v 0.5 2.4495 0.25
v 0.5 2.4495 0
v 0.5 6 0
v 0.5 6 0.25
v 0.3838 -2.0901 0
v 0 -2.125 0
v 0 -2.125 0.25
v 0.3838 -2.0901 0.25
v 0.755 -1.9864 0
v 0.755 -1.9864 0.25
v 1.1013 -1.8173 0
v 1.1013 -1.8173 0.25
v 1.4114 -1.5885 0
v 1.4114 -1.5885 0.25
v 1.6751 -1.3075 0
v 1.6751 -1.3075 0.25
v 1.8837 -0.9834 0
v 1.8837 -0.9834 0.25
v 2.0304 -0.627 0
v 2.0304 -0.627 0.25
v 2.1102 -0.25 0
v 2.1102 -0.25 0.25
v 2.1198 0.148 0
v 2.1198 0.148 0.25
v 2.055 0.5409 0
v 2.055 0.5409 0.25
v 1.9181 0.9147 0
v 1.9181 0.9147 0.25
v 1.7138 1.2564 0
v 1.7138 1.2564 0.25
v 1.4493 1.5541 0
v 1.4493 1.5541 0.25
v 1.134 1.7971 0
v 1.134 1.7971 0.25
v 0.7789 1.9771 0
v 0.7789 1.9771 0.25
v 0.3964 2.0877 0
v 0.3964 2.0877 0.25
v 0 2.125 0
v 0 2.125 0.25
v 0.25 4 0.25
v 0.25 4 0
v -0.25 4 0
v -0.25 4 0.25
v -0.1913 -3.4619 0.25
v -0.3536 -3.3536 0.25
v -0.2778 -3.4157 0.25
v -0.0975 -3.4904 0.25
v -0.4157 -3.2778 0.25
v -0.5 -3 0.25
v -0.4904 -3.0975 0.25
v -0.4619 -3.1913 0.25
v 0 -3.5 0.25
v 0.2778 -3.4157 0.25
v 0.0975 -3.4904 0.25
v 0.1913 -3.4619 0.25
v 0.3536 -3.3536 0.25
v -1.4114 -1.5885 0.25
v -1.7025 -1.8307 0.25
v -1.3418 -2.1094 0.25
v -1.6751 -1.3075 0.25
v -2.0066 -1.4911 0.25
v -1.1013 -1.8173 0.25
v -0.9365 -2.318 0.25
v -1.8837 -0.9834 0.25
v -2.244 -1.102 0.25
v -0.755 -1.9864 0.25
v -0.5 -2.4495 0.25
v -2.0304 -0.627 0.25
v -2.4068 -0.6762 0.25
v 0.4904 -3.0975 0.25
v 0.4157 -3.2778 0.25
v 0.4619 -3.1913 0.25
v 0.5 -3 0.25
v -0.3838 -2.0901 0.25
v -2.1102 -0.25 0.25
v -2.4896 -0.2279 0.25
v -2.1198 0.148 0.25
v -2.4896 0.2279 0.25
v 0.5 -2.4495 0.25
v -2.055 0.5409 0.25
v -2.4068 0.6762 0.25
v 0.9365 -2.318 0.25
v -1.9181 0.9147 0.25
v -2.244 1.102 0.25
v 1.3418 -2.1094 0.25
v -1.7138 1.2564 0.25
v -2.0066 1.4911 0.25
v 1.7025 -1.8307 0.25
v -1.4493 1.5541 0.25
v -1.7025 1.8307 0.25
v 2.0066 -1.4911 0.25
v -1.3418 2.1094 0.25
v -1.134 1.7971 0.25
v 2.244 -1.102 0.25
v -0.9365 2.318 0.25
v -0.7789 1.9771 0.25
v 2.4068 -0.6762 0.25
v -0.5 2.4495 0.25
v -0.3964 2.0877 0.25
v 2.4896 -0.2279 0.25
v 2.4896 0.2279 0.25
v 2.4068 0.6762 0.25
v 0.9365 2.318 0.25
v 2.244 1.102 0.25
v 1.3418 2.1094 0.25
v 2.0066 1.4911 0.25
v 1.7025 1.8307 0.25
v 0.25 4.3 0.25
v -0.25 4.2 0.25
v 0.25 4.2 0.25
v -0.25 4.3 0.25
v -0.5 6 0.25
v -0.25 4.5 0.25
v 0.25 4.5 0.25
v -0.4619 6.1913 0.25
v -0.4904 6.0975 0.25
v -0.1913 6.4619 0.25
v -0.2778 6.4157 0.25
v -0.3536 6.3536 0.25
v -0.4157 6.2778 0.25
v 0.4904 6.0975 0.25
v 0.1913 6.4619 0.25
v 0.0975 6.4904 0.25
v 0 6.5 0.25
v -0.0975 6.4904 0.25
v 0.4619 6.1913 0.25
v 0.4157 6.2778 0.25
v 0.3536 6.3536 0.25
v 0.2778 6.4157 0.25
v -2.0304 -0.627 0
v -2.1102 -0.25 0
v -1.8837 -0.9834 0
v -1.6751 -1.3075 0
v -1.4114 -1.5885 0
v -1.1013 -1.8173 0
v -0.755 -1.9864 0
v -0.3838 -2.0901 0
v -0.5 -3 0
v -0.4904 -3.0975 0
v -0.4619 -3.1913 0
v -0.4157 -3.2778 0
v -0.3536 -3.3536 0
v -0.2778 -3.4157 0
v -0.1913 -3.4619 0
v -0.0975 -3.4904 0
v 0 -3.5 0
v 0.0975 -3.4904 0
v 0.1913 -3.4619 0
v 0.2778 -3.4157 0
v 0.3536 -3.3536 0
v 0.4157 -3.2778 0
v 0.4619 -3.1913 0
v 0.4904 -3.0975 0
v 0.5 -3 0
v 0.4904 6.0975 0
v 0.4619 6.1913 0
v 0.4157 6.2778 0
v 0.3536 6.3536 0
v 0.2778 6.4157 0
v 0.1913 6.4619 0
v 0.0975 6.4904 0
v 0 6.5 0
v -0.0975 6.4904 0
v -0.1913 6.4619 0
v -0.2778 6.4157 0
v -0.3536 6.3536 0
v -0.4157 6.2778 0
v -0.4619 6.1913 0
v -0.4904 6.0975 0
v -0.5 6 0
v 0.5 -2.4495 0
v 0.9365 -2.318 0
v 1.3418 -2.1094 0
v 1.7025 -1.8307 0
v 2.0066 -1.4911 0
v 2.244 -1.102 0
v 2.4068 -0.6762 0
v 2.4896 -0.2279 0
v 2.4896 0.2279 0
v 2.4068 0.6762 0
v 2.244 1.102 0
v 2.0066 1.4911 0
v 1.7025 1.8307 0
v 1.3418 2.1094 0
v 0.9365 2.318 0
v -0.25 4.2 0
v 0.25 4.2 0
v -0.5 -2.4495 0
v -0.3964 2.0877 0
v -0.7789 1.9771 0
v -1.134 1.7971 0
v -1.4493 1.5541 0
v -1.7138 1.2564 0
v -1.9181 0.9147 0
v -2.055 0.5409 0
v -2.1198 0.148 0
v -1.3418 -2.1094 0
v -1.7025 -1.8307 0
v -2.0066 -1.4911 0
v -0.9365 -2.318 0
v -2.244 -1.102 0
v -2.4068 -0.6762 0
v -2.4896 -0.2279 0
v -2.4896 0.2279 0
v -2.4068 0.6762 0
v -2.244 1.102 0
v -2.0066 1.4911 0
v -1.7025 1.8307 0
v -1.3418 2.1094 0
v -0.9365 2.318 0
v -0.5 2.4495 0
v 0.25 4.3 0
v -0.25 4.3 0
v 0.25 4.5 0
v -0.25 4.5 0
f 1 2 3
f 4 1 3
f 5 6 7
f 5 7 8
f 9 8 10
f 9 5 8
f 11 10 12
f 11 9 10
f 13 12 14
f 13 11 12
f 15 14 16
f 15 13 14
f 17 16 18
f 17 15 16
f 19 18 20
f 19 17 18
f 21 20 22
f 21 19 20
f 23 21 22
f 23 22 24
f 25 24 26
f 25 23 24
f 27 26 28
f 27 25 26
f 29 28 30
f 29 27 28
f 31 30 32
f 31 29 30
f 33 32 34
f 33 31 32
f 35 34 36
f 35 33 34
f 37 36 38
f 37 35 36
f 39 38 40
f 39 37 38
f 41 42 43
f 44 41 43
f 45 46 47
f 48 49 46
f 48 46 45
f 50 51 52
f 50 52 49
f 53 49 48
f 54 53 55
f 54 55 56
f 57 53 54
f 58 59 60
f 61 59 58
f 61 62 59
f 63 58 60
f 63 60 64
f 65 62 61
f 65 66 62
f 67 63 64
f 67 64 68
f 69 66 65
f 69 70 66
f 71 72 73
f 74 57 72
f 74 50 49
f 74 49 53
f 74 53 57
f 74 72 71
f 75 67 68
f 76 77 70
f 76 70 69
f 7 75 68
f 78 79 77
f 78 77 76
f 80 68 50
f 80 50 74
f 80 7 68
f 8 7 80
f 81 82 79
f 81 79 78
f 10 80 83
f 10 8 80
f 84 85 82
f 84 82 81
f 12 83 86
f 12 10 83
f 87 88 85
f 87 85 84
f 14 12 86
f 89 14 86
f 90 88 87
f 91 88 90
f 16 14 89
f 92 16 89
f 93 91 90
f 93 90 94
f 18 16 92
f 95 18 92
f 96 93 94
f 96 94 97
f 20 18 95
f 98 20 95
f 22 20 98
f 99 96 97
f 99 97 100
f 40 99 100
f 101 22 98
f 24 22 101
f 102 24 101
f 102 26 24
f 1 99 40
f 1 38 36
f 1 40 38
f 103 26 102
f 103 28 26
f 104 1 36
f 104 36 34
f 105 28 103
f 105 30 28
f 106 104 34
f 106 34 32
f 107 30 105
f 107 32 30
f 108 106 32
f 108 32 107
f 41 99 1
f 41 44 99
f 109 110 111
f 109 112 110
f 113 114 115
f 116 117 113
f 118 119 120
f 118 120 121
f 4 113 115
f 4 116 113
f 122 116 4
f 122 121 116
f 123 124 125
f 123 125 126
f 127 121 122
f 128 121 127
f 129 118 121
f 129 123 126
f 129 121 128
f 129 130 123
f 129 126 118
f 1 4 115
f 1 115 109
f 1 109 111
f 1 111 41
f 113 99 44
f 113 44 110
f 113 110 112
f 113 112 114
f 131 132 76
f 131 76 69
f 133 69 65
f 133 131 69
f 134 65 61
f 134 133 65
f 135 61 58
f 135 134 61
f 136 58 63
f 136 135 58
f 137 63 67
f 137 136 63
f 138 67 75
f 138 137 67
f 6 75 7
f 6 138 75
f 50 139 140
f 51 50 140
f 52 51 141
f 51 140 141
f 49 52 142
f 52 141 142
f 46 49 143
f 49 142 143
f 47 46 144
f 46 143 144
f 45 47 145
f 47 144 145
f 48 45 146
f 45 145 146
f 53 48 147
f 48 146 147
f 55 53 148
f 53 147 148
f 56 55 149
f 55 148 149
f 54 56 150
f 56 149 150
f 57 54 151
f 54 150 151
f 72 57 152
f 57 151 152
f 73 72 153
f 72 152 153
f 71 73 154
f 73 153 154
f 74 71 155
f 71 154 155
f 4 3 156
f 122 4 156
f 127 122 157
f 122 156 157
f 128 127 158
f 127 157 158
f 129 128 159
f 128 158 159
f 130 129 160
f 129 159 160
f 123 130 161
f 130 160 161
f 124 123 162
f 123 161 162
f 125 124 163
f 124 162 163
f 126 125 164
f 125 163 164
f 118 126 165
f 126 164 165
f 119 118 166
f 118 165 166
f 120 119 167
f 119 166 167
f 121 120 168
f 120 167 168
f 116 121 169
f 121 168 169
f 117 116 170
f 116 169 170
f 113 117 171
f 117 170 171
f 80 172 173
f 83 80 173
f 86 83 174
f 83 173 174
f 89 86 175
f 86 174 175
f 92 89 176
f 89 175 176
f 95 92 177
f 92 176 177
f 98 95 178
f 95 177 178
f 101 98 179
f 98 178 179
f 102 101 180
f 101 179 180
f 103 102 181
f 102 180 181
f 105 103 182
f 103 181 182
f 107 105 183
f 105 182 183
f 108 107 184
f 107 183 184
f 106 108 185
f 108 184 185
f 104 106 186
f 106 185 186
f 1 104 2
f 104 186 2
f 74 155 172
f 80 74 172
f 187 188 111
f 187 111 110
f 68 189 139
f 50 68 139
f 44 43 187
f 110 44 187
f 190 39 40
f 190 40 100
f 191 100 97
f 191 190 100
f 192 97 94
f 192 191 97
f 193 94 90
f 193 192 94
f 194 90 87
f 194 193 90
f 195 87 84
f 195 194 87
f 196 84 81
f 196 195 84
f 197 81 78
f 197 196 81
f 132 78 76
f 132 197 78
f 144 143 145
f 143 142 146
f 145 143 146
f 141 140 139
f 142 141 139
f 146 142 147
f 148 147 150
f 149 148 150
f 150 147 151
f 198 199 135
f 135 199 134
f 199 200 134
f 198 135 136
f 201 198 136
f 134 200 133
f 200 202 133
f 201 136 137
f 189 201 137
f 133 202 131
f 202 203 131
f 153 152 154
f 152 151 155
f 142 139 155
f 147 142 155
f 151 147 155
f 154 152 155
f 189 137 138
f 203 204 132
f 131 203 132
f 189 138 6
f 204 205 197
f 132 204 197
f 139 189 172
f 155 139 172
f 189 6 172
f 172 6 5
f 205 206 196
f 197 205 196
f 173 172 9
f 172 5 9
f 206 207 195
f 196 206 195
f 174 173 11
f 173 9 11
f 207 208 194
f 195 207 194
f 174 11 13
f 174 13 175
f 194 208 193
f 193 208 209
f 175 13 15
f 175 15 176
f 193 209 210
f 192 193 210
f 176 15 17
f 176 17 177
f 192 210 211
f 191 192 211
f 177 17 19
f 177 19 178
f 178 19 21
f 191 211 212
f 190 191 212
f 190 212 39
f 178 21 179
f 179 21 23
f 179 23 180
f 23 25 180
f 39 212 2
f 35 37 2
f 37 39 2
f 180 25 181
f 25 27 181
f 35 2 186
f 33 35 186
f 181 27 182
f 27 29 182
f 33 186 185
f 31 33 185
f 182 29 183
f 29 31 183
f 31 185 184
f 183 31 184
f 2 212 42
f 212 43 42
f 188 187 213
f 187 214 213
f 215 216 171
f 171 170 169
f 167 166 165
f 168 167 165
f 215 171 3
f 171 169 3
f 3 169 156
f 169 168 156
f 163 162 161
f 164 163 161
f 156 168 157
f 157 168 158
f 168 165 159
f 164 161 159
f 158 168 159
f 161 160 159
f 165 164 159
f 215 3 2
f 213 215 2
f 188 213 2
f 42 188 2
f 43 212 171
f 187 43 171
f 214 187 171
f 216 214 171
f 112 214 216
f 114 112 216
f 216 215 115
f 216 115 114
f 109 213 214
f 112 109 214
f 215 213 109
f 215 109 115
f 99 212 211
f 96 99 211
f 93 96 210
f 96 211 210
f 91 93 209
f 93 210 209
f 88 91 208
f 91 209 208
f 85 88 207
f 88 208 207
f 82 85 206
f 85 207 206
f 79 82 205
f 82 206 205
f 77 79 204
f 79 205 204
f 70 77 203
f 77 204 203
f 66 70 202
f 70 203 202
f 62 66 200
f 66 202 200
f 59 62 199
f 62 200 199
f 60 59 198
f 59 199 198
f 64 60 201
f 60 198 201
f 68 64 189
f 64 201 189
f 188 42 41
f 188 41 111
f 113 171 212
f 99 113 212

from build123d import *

# Parameters (mm, degrees)
SALIENTE_EXTRUIR1_DEPTH = 0.25
CORTAR_EXTRUIR1_REACH   = 2.25
CROQUIS2_W              = 0.5
CROQUIS2_H              = 0.2


with BuildPart() as part:
    # Croquis1 → Saliente-Extruir1 (new body)
    with BuildSketch(Plane.XY):
        with BuildLine():
            Line((-0.5, -2.449489743), (-0.5, -3))
            ThreePointArc((-0.5, -3), (0, -3.5), (0.5, -3))
            Line((0.5, -3), (0.5, -2.449489743))
            ThreePointArc((0.5, -2.449489743), (2.5, 0), (0.5, 2.449489743))
            Line((0.5, 2.449489743), (0.5, 6))
            ThreePointArc((0.5, 6), (0, 6.5), (-0.5, 6))
            Line((-0.5, 6), (-0.5, 2.449489743))
            ThreePointArc((-0.5, 2.449489743), (-2.5, 0), (-0.5, -2.449489743))
        make_face()
        with BuildLine():
            ThreePointArc((-2.110242877, -0.25), (-1.411448724, -1.588533128), (0, -2.125))
            ThreePointArc((0, -2.125), (1.411448724, -1.588533128), (2.110242877, -0.25))
            ThreePointArc((2.110242877, -0.25), (1.588533128, 1.411448724), (0, 2.125))
            ThreePointArc((0, 2.125), (-1.588533128, 1.411448724), (-2.110242877, -0.25))
        make_face(mode=Mode.SUBTRACT)
    extrude(amount=SALIENTE_EXTRUIR1_DEPTH)

    # Croquis2 → Cortar-Extruir1 (cut, up to next)
    with BuildSketch(Plane(origin=(0, 0, 0), x_dir=(-1, 0, 0), z_dir=(0, 0, -1)), mode=Mode.PRIVATE) as cortar_extruir1_sk1:
        with Locations((0, 4.4)):
            Rectangle(CROQUIS2_W, CROQUIS2_H)
    cortar_extruir1_tool1 = extrude(cortar_extruir1_sk1.sketch, amount=-CORTAR_EXTRUIR1_REACH, mode=Mode.PRIVATE) & part.part
    add(cortar_extruir1_tool1.solids().sort_by_distance((0, 4.4, 0))[0], mode=Mode.SUBTRACT)
    # Croquis2 → Cortar-Extruir1 (cut, up to next)
    with BuildSketch(Plane(origin=(0, 0, 0), x_dir=(-1, 0, 0), z_dir=(0, 0, -1)), mode=Mode.PRIVATE) as cortar_extruir1_sk2:
        with Locations((0, 4.1)):
            Rectangle(CROQUIS2_W, CROQUIS2_H)
    cortar_extruir1_tool2 = extrude(cortar_extruir1_sk2.sketch, amount=-CORTAR_EXTRUIR1_REACH, mode=Mode.PRIVATE) & part.part
    add(cortar_extruir1_tool2.solids().sort_by_distance((0, 4.1, 0))[0], mode=Mode.SUBTRACT)


solid = part.part
